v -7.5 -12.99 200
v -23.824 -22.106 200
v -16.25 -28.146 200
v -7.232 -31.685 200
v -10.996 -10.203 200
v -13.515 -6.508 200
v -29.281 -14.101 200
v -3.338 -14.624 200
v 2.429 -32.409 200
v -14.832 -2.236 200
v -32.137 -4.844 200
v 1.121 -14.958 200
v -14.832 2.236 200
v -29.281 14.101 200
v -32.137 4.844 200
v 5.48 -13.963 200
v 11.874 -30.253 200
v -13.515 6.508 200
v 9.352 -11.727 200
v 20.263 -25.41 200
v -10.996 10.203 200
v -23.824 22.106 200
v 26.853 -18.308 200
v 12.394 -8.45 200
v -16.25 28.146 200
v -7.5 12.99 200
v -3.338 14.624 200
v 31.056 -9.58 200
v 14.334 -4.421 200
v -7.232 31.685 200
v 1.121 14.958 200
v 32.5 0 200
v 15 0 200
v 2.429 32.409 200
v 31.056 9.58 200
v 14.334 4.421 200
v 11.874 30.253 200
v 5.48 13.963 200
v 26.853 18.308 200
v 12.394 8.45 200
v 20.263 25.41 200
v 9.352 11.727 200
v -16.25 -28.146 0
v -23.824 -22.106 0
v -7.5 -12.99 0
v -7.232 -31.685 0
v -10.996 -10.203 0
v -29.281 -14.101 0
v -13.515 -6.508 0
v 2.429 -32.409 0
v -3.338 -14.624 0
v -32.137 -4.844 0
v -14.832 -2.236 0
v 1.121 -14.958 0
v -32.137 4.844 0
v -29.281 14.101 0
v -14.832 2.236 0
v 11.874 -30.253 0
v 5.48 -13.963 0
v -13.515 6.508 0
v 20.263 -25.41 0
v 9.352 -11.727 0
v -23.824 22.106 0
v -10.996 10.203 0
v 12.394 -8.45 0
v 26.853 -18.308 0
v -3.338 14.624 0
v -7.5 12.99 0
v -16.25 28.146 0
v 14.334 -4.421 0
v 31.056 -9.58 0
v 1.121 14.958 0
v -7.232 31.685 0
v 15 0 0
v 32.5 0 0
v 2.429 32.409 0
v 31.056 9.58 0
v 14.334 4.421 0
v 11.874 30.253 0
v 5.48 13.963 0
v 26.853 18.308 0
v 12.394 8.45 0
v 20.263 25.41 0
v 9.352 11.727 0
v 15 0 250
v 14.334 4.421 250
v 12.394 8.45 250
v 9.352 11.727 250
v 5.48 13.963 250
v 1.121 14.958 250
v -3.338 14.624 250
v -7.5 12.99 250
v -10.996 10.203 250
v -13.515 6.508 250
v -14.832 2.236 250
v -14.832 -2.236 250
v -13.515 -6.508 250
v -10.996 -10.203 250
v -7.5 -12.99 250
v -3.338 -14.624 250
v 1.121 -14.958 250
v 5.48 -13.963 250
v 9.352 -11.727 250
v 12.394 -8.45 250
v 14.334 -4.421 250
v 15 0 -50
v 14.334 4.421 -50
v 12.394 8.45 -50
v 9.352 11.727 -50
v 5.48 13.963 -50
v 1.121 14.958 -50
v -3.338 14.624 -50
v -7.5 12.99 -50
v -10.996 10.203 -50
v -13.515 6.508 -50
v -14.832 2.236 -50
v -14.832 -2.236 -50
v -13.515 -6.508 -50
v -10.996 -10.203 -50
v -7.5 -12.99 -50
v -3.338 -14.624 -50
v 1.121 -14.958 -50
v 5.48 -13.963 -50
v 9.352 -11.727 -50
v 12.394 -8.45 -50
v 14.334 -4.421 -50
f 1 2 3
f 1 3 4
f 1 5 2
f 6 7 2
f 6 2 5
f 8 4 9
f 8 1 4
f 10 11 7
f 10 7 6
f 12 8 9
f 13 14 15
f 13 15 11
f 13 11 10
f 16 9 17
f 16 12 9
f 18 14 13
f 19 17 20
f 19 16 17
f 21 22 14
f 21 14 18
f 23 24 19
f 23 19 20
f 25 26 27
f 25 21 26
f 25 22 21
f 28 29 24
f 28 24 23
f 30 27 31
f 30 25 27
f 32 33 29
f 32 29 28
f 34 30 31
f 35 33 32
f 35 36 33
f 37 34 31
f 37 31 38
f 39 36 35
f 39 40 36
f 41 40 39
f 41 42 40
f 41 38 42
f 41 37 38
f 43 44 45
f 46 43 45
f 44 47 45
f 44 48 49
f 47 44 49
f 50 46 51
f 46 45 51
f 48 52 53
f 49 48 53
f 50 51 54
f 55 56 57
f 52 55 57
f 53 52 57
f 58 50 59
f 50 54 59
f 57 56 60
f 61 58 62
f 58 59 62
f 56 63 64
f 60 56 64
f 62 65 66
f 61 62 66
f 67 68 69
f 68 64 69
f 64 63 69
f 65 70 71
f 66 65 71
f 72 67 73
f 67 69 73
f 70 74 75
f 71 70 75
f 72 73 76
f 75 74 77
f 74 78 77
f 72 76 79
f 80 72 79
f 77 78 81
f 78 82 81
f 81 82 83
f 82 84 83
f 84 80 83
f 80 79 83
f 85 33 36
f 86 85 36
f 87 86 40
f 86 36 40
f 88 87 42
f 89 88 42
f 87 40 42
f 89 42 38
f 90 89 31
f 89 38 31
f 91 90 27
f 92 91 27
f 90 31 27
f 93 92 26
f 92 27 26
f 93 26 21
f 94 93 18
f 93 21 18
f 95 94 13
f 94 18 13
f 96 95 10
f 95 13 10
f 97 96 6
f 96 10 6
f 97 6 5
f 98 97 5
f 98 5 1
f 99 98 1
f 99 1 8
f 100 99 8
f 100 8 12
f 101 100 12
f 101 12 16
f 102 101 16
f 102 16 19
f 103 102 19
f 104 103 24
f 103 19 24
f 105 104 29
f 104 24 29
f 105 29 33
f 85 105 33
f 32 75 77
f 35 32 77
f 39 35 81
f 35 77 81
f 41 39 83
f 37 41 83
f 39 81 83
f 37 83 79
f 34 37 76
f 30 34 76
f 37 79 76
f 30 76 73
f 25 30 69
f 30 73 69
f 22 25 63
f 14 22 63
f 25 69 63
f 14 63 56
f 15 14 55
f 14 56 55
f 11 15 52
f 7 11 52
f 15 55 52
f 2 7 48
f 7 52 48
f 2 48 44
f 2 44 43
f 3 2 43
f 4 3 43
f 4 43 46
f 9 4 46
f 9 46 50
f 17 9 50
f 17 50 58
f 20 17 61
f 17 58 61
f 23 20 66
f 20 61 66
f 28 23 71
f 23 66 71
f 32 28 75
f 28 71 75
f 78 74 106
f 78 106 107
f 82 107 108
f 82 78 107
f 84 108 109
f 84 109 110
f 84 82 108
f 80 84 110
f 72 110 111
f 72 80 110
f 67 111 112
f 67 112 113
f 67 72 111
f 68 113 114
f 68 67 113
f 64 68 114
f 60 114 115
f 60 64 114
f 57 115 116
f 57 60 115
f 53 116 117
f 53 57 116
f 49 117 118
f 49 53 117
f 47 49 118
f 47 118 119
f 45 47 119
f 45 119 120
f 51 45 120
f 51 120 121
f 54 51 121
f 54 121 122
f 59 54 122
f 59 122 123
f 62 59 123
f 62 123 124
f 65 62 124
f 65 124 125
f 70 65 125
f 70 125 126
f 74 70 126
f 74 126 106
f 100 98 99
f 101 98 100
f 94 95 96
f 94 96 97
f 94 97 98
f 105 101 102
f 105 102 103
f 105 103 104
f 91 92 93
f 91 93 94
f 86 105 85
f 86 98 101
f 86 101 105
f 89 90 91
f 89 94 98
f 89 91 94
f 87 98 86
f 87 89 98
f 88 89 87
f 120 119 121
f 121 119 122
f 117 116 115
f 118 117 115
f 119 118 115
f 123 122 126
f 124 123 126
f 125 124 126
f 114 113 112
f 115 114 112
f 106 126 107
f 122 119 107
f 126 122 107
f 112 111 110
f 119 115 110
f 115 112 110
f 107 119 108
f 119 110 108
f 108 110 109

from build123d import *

# Parameters (mm, degrees)
F0_R     = 32.5
F1_DEPTH = 200
F2_R     = 15
F3_DEPTH = 50
F4_DEPTH = 250


with BuildPart() as f1:
    # F0 (on Top) → F1 (new body)
    with BuildSketch(Plane.XY):
        Circle(F0_R)
    extrude(amount=F1_DEPTH)

    # F2 (on face) → F3 (join)
    with BuildSketch(Plane.XY.offset(200)):
        Circle(F2_R)
    extrude(amount=F3_DEPTH)

    # F2 (on face) → F4 (join)
    with BuildSketch(Plane.XY.offset(200)):
        Circle(F2_R)
    extrude(amount=-F4_DEPTH)


solid = f1.part
